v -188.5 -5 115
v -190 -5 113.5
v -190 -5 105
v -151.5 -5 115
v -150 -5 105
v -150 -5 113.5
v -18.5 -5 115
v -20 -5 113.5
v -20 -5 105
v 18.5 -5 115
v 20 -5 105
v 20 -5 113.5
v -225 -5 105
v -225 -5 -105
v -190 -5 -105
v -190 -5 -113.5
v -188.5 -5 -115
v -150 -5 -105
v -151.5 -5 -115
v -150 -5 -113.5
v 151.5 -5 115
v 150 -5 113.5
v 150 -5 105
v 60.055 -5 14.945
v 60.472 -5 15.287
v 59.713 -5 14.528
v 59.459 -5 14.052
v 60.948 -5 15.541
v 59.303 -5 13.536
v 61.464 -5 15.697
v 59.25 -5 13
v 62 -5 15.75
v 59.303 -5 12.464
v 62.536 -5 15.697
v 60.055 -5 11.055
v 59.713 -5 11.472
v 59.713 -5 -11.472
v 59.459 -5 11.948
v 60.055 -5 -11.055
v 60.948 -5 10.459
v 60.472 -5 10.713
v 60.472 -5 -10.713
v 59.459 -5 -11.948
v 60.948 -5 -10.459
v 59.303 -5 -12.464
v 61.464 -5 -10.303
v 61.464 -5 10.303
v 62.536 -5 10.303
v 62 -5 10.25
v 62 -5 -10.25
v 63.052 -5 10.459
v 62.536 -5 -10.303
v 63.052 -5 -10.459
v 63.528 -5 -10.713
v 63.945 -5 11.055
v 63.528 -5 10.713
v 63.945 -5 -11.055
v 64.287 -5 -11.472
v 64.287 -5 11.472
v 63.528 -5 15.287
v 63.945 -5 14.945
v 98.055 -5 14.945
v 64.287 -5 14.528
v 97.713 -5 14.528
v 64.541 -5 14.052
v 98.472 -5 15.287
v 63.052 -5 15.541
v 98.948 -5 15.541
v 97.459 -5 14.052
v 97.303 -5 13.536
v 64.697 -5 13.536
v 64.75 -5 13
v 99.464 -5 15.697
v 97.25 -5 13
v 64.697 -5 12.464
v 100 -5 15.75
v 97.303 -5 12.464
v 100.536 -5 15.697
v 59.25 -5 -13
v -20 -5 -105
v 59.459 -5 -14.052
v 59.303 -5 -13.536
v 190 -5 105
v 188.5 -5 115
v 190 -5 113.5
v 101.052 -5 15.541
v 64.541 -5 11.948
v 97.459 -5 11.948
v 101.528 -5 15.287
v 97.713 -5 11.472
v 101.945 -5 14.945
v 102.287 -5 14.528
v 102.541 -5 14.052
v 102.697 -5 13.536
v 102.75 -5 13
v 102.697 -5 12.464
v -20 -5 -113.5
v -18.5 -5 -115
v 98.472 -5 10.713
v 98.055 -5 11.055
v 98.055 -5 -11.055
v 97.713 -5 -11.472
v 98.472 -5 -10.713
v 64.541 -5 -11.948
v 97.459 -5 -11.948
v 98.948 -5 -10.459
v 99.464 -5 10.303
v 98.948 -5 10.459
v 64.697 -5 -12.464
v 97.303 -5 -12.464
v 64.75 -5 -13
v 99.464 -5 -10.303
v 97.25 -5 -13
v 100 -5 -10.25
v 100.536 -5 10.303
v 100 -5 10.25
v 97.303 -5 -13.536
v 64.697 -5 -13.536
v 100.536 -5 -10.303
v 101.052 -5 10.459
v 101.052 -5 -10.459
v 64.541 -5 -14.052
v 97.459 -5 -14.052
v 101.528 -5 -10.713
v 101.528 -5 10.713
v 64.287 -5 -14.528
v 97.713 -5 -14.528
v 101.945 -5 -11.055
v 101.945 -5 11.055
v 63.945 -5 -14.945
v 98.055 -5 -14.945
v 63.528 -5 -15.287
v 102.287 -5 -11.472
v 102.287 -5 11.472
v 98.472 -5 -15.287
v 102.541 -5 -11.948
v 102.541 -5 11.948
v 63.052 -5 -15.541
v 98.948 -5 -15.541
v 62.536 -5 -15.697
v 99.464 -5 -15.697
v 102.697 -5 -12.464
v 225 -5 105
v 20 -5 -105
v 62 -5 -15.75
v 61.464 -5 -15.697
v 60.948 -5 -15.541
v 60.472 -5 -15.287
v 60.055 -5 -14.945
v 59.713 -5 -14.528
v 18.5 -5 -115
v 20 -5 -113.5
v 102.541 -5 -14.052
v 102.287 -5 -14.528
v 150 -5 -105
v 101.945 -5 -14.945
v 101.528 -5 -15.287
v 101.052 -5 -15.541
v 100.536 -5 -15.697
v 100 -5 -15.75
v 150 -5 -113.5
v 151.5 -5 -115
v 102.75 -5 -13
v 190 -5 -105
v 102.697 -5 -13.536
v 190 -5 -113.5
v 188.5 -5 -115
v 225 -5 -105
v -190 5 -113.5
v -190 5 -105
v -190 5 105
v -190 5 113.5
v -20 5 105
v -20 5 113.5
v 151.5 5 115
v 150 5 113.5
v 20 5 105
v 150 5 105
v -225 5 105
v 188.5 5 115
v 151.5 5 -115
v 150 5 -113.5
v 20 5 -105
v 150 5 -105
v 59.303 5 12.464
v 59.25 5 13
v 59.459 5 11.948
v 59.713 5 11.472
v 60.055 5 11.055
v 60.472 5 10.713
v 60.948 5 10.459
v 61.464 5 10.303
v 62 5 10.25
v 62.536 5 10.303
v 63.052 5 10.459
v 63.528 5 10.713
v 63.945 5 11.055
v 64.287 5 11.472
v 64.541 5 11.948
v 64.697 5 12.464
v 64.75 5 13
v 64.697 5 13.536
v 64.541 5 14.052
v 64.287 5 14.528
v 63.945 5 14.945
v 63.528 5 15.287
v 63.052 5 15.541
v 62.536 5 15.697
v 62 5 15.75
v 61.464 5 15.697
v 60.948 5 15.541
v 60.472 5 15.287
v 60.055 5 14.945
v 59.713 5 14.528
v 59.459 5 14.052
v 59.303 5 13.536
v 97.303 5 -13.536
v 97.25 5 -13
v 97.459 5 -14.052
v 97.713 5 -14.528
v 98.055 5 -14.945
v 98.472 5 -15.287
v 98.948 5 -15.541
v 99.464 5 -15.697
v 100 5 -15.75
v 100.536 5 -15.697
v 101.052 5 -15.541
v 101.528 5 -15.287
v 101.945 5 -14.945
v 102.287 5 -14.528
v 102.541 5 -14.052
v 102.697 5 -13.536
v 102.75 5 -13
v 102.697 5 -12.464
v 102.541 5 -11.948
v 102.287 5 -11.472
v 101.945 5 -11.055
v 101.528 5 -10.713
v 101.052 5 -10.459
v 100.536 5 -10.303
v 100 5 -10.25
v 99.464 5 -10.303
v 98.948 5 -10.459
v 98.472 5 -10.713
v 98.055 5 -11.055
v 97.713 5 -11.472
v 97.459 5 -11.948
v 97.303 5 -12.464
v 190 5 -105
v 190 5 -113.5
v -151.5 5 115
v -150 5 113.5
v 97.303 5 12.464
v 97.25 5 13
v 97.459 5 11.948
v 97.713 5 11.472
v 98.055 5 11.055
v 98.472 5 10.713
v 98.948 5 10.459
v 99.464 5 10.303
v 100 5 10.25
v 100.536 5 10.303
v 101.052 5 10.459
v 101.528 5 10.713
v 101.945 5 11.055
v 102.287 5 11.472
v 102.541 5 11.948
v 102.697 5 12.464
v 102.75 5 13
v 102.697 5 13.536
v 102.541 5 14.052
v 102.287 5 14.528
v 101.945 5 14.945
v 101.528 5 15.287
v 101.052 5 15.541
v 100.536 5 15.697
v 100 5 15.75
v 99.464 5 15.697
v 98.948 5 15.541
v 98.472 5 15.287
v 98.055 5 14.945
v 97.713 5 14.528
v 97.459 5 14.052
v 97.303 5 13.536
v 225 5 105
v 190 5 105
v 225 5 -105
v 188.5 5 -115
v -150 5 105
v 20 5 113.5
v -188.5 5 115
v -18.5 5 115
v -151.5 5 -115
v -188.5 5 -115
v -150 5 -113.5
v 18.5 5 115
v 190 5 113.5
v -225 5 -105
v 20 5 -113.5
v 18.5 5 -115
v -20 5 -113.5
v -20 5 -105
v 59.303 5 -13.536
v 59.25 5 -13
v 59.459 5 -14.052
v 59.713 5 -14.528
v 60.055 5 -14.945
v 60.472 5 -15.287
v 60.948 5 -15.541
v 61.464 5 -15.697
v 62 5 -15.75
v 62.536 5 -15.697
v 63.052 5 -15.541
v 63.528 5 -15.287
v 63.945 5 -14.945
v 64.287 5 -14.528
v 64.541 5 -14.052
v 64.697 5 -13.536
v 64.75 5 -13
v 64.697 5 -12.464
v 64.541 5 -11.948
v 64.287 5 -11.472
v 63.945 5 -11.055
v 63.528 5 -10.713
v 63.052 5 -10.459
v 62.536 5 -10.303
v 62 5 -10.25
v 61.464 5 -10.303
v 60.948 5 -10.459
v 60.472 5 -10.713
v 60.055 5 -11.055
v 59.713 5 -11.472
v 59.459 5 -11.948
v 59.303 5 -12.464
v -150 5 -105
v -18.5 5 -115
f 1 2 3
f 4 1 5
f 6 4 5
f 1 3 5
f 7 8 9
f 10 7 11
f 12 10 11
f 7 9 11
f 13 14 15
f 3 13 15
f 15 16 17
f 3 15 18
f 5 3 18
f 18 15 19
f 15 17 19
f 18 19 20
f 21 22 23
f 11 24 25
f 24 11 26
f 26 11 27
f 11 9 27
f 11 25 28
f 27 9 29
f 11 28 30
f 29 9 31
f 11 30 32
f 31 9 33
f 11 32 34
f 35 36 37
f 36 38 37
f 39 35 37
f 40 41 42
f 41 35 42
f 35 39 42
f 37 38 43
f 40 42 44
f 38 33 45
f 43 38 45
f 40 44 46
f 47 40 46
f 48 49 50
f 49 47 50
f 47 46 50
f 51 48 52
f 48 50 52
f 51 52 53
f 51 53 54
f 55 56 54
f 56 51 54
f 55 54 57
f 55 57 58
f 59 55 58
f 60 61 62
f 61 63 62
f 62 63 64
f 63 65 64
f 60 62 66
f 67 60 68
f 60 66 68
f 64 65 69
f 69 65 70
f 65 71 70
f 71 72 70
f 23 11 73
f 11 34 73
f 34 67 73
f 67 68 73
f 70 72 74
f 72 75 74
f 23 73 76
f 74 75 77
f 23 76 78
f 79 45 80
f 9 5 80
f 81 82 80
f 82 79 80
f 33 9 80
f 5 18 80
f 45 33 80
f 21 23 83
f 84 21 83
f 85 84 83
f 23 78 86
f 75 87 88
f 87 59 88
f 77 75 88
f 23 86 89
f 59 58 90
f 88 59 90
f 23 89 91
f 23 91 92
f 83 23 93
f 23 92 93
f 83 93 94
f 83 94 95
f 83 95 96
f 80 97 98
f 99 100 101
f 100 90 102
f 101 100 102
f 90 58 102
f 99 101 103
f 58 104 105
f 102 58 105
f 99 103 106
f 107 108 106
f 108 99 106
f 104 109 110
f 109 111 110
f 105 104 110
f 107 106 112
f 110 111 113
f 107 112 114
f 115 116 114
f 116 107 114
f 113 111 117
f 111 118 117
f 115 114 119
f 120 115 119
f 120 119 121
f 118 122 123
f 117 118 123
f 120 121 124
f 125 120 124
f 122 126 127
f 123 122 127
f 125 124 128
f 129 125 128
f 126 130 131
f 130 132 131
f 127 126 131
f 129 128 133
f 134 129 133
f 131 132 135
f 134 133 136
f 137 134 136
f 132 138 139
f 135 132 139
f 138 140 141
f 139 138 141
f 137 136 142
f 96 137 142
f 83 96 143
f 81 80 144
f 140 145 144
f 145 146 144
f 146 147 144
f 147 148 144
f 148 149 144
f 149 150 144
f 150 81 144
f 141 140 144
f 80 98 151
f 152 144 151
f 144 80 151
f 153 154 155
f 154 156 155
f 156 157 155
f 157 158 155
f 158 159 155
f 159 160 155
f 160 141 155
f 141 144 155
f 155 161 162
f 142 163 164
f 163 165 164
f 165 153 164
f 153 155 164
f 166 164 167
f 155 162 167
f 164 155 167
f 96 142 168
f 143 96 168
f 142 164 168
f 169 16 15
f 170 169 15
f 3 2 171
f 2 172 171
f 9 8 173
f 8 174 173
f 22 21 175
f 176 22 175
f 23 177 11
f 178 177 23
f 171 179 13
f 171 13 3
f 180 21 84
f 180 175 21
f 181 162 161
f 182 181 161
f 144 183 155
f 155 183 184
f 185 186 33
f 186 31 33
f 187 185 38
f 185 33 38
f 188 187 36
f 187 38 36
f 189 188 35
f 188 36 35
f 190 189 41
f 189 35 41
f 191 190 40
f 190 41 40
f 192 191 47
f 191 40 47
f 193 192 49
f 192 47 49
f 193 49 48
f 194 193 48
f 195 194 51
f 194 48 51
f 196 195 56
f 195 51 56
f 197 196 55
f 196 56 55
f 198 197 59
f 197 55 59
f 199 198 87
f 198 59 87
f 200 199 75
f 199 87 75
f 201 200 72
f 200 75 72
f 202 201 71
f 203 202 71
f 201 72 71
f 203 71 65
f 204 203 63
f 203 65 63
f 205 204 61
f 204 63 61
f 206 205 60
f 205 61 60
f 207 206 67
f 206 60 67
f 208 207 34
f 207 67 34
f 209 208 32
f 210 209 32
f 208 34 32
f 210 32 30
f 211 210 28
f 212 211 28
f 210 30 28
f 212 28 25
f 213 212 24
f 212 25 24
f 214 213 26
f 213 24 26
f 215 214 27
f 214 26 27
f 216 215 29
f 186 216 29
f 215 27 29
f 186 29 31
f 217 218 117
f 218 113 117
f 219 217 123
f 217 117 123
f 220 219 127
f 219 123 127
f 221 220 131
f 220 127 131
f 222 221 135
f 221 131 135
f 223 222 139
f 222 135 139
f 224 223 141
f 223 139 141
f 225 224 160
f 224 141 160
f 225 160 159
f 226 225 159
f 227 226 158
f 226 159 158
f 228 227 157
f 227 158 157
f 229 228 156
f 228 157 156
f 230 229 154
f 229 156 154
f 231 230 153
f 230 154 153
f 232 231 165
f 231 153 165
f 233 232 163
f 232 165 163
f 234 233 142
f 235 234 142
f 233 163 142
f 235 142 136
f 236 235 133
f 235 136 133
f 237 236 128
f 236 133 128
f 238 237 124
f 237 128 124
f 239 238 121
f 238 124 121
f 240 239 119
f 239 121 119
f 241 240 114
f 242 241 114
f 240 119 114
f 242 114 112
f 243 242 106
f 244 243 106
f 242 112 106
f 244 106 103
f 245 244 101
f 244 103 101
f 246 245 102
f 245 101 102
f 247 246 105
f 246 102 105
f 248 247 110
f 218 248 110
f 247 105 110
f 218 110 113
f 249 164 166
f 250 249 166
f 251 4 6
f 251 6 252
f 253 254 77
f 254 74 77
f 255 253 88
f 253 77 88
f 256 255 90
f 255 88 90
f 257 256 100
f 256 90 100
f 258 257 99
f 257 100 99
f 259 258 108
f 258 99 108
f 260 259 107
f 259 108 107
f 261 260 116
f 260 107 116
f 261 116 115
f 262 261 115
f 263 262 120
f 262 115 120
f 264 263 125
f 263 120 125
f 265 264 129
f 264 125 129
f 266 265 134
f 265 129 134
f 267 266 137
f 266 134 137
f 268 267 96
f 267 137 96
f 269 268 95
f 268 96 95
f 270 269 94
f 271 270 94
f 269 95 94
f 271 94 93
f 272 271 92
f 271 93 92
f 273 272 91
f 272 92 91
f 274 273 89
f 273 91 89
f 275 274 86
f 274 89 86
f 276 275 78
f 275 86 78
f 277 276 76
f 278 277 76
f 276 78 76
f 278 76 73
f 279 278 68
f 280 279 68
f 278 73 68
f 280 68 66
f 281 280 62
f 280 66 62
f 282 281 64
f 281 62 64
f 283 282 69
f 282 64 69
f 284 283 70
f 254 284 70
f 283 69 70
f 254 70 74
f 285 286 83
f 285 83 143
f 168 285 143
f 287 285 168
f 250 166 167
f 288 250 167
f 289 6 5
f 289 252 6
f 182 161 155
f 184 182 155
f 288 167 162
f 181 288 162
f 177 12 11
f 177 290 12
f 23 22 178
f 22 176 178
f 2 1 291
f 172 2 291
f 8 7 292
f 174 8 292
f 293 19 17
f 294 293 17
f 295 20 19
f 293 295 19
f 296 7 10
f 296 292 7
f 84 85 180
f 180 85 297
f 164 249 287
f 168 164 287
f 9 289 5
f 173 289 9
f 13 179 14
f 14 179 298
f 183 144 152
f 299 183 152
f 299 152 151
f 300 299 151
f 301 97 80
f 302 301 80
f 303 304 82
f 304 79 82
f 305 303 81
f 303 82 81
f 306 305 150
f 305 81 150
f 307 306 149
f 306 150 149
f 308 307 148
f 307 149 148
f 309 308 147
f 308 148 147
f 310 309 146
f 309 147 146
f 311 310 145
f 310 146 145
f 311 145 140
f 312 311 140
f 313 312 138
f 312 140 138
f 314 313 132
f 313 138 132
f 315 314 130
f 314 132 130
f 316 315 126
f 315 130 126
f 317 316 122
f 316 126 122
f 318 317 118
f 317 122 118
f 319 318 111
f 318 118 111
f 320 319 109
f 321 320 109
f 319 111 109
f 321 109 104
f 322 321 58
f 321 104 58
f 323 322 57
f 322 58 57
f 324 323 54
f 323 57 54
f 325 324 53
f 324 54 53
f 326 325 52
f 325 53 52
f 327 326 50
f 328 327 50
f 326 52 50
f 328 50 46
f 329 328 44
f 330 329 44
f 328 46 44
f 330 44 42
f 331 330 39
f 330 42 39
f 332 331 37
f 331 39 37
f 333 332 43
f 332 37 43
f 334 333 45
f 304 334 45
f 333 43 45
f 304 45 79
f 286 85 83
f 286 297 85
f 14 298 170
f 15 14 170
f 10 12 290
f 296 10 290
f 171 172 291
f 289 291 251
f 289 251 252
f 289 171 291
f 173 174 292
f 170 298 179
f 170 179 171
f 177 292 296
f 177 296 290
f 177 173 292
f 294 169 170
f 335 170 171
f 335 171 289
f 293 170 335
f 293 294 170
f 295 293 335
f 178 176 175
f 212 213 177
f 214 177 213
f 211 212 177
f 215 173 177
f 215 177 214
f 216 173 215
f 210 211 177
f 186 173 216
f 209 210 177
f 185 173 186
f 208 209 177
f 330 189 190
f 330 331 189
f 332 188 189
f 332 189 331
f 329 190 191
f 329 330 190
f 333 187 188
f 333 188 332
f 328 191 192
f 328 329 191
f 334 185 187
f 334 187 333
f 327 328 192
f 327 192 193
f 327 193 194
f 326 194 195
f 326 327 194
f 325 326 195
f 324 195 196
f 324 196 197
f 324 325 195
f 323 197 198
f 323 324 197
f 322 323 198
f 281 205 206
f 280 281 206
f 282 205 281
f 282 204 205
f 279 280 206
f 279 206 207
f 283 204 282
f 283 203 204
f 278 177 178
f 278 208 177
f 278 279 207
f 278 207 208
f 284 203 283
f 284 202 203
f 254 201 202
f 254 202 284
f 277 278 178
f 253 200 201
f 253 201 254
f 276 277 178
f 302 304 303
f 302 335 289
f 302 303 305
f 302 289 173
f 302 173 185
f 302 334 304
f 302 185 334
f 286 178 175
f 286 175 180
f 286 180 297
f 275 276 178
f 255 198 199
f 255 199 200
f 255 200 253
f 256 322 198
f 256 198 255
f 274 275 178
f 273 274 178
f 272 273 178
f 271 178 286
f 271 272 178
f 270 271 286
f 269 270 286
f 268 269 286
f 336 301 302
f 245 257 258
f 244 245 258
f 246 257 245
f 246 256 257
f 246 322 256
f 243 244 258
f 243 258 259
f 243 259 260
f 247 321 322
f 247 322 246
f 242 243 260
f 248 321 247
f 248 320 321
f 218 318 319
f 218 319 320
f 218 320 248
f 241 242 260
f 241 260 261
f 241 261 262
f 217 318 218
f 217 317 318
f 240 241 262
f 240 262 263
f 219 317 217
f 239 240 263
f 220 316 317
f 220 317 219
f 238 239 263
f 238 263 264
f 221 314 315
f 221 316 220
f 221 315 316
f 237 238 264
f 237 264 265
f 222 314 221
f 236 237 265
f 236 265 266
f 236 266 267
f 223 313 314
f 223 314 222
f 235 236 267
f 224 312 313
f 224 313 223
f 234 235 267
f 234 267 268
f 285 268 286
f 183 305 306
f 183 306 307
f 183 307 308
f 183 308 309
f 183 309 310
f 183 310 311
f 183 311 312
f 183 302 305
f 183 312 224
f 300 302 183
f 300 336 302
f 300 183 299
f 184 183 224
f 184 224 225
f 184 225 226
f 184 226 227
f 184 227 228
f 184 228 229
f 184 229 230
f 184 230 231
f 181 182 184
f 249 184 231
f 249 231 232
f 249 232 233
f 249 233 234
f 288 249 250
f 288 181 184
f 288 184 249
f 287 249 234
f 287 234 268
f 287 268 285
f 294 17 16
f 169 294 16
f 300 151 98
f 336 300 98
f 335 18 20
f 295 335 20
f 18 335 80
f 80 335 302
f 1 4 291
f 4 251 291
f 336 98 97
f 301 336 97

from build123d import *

# Parameters (mm, degrees)
SKETCH_1_W                       = 450
SKETCH_1_H                       = 210
EXTRUDE_797_DEPTH                = 5
SKETCH_2_W                       = 40
SKETCH_2_H                       = 10
EXTRUDE_849_DEPTH                = 5
CHAMFER_897_SIZE                 = 1.5
SKETCH_3_W                       = 40
SKETCH_3_H                       = 10
EXTRUDE_968_DEPTH                = 5
CHAMFER_1013_SIZE                = 1.5
CHAMFER_1013_OF_MIRROR_1076_SIZE = 1.5
MIRROR_START                     = -5
MIRROR_1098_DEPTH                = 10
HOLE_WIZARD_1123_D               = 5.5
HOLE_WIZARD_1123_DEPTH           = 10
HOLE_WIZARD_1123_TIP             = 1.652366702


# Read off the part's stored shape, not the designer's step: ほぞ(左)
with BuildPart() as part:
    # ｽｹｯﾁ1 → Extrude 797 (new, symmetric)
    with BuildSketch(Plane(origin=(0, 0, 0), x_dir=(1, 0, 0), z_dir=(0, 1, 0))):
        Rectangle(SKETCH_1_W, SKETCH_1_H)
    extrude(amount=EXTRUDE_797_DEPTH, both=True)

    # ｽｹｯﾁ2 → Extrude 849 (add, symmetric)
    with BuildSketch(Plane(origin=(0, 0, 0), x_dir=(1, 0, 0), z_dir=(0, 1, 0))):
        with Locations((0, -110)):
            Rectangle(SKETCH_2_W, SKETCH_2_H)
    extrude(amount=EXTRUDE_849_DEPTH, both=True)

    # Chamfer 897
    chamfer_897_edges = [part.edges().sort_by_distance(p)[0] for p in [
        (-20, 0, 115),
        (20, 0, 115),
    ]]
    chamfer(chamfer_897_edges, length=CHAMFER_897_SIZE)

    # ｽｹｯﾁ3 → Extrude 968 (add, symmetric)
    with BuildSketch(Plane(origin=(0, 0, 0), x_dir=(1, 0, 0), z_dir=(0, 1, 0))):
        with Locations((170, -110)):
            Rectangle(SKETCH_3_W, SKETCH_3_H)
    extrude_968 = extrude(amount=EXTRUDE_968_DEPTH, both=True)

    # Chamfer 1013
    chamfer_1013_edges = [part.edges().sort_by_distance(p)[0] for p in [
        (150, 0, 115),
        (190, 0, 115),
    ]]
    chamfer(chamfer_1013_edges, length=CHAMFER_1013_SIZE)

    # Mirror 1076: Extrude 968 across plane
    add(extrude_968.mirror(Plane(origin=(0, 0, 0), x_dir=(0, 0, 1), z_dir=(1, 0, 0))))

    # Chamfer 1013 of Mirror 1076
    chamfer_1013_of_mirror_1076_edges = [part.edges().sort_by_distance(p)[0] for p in [
        (-150, 0, 115),
        (-190, 0, 115),
    ]]
    chamfer(chamfer_1013_of_mirror_1076_edges, length=CHAMFER_1013_OF_MIRROR_1076_SIZE)

    # Mirror 1098 outline → Mirror 1098 (add)
    with BuildSketch(Plane(origin=(0, 0, 0), x_dir=(1, 0, 0), z_dir=(0, 1, 0)).offset(MIRROR_START)):
        Polygon((-18.5, 115), (-20, 113.5), (-20, 105), (20, 105), (20, 113.5), (18.5, 115), align=None)
        Polygon((150, 113.5), (150, 105), (190, 105), (190, 113.5), (188.5, 115), (151.5, 115), align=None)
        Polygon((-190, 105), (-150, 105), (-150, 113.5), (-151.5, 115), (-188.5, 115), (-190, 113.5), align=None)
    extrude(amount=MIRROR_1098_DEPTH)

    # Hole Wizard 1123
    with Locations(Plane(origin=(0, 5, 0), x_dir=(1, 0, 0), z_dir=(0, 1, 0))):
        with Locations((100, -13), (100, 13), (62, -13), (62, 13)):
            Hole(HOLE_WIZARD_1123_D / 2, depth=HOLE_WIZARD_1123_DEPTH)
            with Locations((0, 0, -(HOLE_WIZARD_1123_DEPTH + HOLE_WIZARD_1123_TIP / 2))):  # 118° drill point
                Cone(0, HOLE_WIZARD_1123_D / 2, HOLE_WIZARD_1123_TIP, mode=Mode.SUBTRACT)


solid = part.part
